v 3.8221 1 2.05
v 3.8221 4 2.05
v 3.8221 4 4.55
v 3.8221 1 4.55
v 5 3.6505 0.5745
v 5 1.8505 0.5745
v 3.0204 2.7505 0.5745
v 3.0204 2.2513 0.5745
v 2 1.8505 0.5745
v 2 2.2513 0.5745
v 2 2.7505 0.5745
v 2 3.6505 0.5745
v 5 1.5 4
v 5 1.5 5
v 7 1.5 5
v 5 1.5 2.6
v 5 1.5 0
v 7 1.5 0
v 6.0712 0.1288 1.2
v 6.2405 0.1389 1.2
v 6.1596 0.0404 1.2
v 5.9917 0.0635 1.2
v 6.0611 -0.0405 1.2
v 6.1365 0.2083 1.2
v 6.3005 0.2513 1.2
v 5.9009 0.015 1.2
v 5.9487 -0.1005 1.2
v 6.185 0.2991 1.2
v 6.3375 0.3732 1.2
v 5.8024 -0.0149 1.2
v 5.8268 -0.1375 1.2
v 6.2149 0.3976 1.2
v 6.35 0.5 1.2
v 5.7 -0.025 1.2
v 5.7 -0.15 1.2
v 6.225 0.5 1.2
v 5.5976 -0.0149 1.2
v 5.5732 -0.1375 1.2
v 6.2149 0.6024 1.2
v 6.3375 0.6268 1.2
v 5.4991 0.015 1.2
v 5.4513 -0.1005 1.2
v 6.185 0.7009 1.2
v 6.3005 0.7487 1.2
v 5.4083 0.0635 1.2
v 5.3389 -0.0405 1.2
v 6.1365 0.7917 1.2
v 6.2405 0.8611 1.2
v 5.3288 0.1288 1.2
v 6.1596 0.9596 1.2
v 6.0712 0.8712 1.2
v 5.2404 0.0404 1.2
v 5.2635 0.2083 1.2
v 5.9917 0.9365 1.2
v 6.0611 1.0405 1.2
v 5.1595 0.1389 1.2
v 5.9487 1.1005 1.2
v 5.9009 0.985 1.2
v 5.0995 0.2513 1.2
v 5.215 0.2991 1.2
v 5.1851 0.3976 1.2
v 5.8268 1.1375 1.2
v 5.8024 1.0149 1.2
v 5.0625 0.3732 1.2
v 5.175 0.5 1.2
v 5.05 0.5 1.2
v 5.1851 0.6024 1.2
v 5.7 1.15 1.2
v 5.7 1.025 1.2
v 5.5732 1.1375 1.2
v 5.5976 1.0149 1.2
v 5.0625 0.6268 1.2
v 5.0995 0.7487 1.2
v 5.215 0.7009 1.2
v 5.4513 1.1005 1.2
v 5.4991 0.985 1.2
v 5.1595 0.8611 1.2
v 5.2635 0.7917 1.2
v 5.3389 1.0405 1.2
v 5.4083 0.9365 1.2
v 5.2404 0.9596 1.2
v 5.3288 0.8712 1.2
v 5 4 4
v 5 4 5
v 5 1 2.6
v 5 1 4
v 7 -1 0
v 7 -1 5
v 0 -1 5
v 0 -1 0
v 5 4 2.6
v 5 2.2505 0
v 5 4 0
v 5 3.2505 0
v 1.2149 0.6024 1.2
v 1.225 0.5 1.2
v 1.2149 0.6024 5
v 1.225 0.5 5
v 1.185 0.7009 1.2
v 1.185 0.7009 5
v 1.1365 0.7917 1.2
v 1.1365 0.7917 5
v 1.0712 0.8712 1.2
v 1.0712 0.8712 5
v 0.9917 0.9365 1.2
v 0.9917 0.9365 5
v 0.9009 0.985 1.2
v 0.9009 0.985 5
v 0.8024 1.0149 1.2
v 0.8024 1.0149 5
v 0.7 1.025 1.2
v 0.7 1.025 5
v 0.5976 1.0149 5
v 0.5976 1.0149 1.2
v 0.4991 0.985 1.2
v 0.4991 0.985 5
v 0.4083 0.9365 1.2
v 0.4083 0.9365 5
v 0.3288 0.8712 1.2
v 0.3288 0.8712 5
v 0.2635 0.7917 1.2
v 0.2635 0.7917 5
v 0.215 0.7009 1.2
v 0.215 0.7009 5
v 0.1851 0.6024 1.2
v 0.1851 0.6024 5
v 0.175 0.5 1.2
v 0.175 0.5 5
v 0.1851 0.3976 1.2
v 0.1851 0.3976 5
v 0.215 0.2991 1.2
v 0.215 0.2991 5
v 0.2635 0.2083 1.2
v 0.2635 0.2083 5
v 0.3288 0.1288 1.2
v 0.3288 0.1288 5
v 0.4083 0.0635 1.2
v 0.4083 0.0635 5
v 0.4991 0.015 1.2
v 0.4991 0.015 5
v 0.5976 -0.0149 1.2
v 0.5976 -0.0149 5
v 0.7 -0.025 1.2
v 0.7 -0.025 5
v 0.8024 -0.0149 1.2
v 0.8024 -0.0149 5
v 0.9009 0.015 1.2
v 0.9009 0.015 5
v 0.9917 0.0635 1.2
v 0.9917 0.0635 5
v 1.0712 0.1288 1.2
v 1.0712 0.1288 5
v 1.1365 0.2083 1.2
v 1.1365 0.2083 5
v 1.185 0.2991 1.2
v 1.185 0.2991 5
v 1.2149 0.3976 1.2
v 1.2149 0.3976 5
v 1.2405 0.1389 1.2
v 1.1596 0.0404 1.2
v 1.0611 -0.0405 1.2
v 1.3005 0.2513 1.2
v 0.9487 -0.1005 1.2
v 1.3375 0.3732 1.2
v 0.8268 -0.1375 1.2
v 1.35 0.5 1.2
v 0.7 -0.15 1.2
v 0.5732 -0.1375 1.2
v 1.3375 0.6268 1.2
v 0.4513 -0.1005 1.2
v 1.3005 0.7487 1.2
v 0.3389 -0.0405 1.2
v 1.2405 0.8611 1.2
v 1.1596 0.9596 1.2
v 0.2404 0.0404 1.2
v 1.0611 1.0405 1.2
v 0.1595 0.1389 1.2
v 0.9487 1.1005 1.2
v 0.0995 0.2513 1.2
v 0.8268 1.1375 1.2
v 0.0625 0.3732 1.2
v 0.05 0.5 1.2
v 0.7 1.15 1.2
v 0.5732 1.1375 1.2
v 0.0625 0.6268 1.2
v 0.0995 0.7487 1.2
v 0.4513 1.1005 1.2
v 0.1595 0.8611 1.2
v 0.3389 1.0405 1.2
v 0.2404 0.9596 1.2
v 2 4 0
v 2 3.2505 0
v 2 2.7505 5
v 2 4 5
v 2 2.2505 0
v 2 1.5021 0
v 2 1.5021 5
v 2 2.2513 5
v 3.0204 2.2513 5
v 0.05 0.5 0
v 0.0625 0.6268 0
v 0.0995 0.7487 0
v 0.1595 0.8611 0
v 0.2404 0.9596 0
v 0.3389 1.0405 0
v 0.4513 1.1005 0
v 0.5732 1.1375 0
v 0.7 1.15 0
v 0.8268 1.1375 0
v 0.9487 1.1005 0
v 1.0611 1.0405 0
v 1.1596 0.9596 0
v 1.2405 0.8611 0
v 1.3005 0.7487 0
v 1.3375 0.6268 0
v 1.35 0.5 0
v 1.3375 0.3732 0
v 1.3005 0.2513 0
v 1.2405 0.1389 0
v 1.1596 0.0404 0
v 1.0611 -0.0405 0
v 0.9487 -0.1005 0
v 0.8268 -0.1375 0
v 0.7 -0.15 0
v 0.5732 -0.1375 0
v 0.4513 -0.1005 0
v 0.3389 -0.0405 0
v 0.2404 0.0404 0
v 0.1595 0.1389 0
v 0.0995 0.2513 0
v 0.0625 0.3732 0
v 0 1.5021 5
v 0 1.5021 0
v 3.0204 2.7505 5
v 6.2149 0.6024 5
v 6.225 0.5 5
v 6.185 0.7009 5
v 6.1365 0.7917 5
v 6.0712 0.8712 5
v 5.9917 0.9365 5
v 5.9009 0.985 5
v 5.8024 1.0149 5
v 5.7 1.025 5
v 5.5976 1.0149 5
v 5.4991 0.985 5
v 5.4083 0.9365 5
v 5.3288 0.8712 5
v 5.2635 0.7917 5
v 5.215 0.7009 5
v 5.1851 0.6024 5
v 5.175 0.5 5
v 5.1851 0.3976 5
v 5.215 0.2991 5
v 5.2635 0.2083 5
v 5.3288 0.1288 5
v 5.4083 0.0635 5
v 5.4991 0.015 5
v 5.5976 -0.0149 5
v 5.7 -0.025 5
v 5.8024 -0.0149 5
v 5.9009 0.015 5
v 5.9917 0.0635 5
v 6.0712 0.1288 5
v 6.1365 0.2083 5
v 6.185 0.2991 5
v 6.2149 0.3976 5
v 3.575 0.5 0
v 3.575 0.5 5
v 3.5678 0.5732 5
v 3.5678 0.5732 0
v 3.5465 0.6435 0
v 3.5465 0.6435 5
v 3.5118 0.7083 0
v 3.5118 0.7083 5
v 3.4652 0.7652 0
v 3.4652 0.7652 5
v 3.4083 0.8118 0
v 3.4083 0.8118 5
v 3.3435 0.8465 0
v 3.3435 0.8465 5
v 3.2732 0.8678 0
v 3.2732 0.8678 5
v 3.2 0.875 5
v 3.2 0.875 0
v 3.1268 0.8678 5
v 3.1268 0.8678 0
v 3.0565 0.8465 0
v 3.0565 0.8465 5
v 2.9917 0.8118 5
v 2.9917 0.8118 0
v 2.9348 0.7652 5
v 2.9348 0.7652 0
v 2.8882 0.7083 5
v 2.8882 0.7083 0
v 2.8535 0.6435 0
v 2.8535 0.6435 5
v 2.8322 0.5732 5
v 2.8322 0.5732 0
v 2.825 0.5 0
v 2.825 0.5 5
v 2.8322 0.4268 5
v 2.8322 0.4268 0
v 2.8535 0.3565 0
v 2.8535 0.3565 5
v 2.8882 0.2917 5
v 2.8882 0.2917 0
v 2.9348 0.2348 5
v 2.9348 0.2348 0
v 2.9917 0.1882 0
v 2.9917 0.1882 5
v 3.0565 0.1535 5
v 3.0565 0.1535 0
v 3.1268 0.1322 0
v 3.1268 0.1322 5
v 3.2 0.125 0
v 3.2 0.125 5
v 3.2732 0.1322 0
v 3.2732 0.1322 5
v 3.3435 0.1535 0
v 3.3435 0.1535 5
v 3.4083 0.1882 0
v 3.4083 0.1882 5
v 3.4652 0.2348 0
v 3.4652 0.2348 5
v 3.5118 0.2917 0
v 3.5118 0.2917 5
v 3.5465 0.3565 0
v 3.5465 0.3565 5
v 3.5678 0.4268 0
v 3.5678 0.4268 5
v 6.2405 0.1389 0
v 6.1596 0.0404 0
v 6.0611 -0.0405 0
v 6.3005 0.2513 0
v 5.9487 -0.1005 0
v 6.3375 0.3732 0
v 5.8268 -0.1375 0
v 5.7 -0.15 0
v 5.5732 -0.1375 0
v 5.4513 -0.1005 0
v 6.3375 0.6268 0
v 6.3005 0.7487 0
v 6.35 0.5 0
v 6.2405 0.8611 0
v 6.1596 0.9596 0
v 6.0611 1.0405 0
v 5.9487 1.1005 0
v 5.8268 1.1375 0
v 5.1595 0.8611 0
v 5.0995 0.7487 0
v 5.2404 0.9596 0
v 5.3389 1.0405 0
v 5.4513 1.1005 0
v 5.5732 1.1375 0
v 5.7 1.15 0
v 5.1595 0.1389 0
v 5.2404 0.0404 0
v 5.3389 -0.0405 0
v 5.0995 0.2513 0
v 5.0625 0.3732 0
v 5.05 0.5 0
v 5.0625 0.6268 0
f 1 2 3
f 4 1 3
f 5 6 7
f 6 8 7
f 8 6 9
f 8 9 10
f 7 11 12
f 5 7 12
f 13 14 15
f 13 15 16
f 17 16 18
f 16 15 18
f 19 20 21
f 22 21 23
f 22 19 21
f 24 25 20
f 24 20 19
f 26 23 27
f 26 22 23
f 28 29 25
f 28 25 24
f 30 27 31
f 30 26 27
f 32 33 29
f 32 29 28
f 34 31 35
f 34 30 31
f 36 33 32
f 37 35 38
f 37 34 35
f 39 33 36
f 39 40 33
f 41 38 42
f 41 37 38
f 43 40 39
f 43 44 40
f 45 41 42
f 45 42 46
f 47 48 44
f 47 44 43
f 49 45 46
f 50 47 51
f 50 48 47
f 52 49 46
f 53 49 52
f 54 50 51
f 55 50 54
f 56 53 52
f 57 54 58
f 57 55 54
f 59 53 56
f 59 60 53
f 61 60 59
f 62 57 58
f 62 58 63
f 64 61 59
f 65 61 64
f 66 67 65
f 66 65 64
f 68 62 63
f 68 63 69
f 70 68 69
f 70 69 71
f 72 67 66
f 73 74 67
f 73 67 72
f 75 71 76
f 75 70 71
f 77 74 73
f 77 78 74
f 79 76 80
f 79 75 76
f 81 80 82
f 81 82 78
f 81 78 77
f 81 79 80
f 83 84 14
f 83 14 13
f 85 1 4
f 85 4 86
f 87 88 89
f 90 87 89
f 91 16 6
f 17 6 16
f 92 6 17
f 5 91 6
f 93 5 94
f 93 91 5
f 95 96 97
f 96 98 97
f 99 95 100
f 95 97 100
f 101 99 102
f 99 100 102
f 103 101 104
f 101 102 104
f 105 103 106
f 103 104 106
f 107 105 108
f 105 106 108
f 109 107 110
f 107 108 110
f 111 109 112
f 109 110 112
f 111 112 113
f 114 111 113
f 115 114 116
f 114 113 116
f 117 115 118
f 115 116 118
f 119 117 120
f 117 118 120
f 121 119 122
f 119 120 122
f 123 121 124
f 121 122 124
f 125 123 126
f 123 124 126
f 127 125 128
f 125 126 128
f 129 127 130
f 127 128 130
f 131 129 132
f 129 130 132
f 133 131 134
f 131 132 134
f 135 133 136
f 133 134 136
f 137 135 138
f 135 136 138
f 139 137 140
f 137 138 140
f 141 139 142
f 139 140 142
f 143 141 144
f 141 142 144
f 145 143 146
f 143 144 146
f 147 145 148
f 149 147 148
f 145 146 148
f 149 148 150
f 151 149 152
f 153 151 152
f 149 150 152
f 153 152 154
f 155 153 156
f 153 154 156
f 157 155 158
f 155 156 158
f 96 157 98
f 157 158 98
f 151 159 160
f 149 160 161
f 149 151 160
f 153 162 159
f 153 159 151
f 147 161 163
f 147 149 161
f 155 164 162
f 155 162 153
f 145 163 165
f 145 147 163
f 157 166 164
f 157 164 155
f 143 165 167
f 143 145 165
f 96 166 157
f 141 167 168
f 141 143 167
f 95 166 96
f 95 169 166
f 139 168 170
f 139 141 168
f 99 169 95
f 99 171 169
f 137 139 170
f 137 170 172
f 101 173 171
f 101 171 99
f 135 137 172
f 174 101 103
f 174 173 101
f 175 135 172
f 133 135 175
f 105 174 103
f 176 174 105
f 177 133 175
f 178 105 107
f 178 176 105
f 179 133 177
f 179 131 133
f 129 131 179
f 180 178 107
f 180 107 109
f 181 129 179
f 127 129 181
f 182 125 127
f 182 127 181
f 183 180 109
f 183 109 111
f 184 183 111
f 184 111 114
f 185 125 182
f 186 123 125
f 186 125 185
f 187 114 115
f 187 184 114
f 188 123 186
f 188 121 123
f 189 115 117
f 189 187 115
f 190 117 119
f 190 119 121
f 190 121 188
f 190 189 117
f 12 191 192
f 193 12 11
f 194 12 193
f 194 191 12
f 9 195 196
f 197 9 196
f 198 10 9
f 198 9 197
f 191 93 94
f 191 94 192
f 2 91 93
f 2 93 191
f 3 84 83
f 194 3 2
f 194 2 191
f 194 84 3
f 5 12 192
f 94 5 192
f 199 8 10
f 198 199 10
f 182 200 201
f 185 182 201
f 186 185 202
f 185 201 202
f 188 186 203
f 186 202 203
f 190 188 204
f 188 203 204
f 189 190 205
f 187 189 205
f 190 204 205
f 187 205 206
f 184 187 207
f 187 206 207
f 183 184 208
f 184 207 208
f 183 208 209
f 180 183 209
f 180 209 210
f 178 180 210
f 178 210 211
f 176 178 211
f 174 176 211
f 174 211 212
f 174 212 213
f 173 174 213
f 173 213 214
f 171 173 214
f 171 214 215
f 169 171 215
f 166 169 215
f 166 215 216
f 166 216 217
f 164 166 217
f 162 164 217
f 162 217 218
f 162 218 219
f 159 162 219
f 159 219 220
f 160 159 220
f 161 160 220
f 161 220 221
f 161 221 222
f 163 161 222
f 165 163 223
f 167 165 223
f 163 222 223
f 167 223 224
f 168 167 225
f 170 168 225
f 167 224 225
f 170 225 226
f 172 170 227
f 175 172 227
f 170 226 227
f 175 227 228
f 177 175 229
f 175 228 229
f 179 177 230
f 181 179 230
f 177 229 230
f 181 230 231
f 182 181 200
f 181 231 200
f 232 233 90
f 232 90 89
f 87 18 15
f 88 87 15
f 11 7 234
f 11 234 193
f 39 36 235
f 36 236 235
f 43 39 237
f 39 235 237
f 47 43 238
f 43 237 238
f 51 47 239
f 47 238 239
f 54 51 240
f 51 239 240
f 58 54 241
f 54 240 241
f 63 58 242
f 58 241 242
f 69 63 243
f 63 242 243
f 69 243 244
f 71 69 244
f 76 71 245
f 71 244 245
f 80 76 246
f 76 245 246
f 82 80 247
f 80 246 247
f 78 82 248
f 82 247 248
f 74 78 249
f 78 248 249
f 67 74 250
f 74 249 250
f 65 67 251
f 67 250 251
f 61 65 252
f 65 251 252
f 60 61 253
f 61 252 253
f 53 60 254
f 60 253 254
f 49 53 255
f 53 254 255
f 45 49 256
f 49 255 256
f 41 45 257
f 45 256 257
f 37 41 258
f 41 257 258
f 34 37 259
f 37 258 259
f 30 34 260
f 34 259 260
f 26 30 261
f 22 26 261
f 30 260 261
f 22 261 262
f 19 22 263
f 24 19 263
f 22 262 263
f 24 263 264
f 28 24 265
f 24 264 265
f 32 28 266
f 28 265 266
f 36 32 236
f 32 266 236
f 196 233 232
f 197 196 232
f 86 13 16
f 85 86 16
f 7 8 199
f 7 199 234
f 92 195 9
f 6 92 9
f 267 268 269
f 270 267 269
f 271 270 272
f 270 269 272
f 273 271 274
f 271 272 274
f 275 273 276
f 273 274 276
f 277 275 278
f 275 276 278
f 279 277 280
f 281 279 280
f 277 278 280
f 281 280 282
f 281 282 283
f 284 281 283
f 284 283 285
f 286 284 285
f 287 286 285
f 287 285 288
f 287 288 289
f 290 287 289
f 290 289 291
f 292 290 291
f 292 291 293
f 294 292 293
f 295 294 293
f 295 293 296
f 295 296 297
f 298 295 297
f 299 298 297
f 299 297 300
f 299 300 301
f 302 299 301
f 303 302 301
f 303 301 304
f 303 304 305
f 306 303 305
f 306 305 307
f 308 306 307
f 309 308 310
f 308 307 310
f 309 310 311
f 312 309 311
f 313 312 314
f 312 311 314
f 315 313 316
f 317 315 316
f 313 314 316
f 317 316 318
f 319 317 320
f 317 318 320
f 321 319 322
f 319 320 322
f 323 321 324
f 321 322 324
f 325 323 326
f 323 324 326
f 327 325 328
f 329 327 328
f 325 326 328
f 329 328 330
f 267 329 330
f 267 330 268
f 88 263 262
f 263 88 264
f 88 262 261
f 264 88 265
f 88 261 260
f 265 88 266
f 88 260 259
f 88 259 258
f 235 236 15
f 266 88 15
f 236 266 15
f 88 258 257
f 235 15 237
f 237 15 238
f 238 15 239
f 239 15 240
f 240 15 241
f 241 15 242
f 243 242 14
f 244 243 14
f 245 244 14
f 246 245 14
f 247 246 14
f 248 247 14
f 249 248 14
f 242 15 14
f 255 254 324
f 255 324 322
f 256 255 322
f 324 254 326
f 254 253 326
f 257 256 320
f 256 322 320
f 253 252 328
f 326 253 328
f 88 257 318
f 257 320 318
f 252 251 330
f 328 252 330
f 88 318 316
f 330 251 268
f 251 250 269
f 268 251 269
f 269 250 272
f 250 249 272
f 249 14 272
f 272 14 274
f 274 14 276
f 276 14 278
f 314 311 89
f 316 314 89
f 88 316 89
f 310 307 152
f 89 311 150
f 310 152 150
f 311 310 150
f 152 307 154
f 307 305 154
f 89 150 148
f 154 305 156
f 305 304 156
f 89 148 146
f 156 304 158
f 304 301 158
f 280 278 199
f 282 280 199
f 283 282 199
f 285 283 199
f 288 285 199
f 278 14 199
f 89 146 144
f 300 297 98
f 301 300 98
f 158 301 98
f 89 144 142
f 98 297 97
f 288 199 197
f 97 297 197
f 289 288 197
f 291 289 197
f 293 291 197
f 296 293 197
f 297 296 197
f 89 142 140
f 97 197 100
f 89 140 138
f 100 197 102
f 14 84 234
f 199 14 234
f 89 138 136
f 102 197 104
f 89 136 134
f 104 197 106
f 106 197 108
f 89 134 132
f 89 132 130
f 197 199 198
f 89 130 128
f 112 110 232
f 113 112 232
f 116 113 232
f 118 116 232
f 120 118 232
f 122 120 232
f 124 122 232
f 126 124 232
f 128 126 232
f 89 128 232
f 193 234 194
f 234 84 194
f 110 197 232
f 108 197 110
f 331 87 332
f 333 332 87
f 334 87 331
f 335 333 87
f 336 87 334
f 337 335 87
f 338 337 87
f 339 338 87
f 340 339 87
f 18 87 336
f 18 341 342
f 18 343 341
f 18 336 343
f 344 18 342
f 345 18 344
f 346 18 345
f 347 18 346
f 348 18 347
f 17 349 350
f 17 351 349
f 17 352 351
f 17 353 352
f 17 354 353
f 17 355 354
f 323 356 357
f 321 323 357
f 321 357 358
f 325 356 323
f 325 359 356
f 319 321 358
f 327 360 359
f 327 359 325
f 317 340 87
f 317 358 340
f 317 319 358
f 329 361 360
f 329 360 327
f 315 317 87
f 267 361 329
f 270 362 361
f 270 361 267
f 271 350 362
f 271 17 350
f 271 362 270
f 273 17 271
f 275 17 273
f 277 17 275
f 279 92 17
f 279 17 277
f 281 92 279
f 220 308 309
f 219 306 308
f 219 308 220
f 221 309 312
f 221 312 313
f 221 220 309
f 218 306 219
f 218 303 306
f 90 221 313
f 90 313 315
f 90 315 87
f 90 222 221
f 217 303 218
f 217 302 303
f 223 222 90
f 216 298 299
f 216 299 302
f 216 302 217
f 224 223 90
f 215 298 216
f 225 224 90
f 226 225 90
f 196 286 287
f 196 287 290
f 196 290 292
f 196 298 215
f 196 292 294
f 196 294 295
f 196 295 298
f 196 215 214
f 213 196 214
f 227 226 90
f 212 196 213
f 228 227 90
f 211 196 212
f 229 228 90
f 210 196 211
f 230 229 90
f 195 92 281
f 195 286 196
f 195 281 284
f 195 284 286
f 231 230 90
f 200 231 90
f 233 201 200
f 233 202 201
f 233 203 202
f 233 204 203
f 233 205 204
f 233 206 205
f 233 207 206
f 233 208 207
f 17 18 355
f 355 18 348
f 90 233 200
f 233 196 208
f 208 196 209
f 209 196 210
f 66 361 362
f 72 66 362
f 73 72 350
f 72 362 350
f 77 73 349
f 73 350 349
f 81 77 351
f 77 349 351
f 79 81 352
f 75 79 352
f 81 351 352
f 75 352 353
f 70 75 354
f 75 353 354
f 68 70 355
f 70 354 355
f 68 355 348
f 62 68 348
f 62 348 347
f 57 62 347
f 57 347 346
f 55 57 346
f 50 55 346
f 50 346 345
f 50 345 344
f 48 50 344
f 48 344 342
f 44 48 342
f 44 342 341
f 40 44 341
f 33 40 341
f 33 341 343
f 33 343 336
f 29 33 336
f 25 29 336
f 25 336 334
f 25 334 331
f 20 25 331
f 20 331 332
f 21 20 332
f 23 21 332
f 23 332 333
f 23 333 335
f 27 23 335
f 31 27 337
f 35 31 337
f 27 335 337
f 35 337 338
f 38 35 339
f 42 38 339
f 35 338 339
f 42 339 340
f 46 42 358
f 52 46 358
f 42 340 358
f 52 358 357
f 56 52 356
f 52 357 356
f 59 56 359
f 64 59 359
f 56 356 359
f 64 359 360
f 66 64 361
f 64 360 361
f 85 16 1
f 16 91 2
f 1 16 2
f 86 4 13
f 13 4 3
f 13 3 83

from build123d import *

# Parameters (mm, degrees)
SKETCH1_W                = 7
SKETCH1_H                = 5
BOSS_EXTRUDE1_DEPTH      = 5
HOLE1_D                  = 1.05
HOLE1_CBORE_D            = 1.3
HOLE1_CBORE_DEPTH        = 1.2
SKETCH20_W               = 5
SKETCH20_H               = 2.5
CUT_EXTRUDE11_DEPTH      = 2
M1_0X0_25_TAPPED_HOLE1_D = 0.75
SKETCH37_W               = 5
SKETCH37_H               = 2.5
CUT_EXTRUDE13_DEPTH      = 2
CUT_EXTRUDE15_DEPTH      = 3
CUT_EXTRUDE16_DEPTH      = 9.124038405
SKETCH44_W               = 1.020368792
SKETCH44_H               = 0.499253319
CUT_EXTRUDE17_DEPTH      = 10.197034161


with BuildPart() as part:
    # Sketch1 → Boss-Extrude1 (new body)
    with BuildSketch(Plane(origin=(0, 4, 0), x_dir=(-1, 0, 0), z_dir=(0, 1, 0))):
        with Locations((-3.5, 2.5)):
            Rectangle(SKETCH1_W, SKETCH1_H)
    extrude(amount=-BOSS_EXTRUDE1_DEPTH)

    # Hole1 (through all)
    with Locations(Plane(origin=(0, 0, 0), x_dir=(-1, 0, 0), z_dir=(0, 0, -1))):
        with Locations((-5.7, 0.5), (-0.7, 0.5)):
            CounterBoreHole(HOLE1_D / 2, HOLE1_CBORE_D / 2, HOLE1_CBORE_DEPTH)

    # Sketch20 → Cut-Extrude11 (cut)
    with BuildSketch(Plane(origin=(7, 0, 0), x_dir=(0, 0, -1), z_dir=(1, 0, 0))):
        with Locations((-2.5, 2.75)):
            Rectangle(SKETCH20_W, SKETCH20_H)
    extrude(amount=-CUT_EXTRUDE11_DEPTH, mode=Mode.SUBTRACT)

    # M1.0x0.25 Tapped Hole1 (through all)
    with Locations(Plane(origin=(0, 0, 0), x_dir=(-1, 0, 0), z_dir=(0, 0, -1))):
        with Locations((-3.2, 0.5)):
            Hole(M1_0X0_25_TAPPED_HOLE1_D / 2)

    # Sketch37 → Cut-Extrude13 (cut)
    with BuildSketch(Plane.ZY):
        with Locations((2.5, 2.752068207)):
            Rectangle(SKETCH37_W, SKETCH37_H)
    extrude(amount=-CUT_EXTRUDE13_DEPTH, mode=Mode.SUBTRACT)

    # Sketch41 → Cut-Extrude15 (cut)
    with BuildSketch(Plane(origin=(0, 4, 0), x_dir=(1, 0, 0), z_dir=(0, 1, 0))):
        Polygon((5, -2.6), (3.822078101, -2.05), (3.822078101, -4.55), (5, -4), align=None)
    extrude(amount=-CUT_EXTRUDE15_DEPTH, mode=Mode.SUBTRACT)

    # Sketch43 → Cut-Extrude16 (cut, through all)
    with BuildSketch(Plane.ZY.offset(-2)):
        Polygon((0, 2.250519753), (0.574456265, 1.850519753), (0.574456265, 3.650519753), (0, 3.250519753), align=None)
    extrude(amount=-CUT_EXTRUDE16_DEPTH, mode=Mode.SUBTRACT)

    # Sketch44 → Cut-Extrude17 (cut, through all)
    with BuildSketch(Plane(origin=(0, 0, 0.574456265), x_dir=(-1, 0, 0), z_dir=(0, 0, -1))):
        with Locations((-2.510184396, 2.500893094)):
            Rectangle(SKETCH44_W, SKETCH44_H)
    extrude(amount=-CUT_EXTRUDE17_DEPTH, mode=Mode.SUBTRACT)


solid = part.part
